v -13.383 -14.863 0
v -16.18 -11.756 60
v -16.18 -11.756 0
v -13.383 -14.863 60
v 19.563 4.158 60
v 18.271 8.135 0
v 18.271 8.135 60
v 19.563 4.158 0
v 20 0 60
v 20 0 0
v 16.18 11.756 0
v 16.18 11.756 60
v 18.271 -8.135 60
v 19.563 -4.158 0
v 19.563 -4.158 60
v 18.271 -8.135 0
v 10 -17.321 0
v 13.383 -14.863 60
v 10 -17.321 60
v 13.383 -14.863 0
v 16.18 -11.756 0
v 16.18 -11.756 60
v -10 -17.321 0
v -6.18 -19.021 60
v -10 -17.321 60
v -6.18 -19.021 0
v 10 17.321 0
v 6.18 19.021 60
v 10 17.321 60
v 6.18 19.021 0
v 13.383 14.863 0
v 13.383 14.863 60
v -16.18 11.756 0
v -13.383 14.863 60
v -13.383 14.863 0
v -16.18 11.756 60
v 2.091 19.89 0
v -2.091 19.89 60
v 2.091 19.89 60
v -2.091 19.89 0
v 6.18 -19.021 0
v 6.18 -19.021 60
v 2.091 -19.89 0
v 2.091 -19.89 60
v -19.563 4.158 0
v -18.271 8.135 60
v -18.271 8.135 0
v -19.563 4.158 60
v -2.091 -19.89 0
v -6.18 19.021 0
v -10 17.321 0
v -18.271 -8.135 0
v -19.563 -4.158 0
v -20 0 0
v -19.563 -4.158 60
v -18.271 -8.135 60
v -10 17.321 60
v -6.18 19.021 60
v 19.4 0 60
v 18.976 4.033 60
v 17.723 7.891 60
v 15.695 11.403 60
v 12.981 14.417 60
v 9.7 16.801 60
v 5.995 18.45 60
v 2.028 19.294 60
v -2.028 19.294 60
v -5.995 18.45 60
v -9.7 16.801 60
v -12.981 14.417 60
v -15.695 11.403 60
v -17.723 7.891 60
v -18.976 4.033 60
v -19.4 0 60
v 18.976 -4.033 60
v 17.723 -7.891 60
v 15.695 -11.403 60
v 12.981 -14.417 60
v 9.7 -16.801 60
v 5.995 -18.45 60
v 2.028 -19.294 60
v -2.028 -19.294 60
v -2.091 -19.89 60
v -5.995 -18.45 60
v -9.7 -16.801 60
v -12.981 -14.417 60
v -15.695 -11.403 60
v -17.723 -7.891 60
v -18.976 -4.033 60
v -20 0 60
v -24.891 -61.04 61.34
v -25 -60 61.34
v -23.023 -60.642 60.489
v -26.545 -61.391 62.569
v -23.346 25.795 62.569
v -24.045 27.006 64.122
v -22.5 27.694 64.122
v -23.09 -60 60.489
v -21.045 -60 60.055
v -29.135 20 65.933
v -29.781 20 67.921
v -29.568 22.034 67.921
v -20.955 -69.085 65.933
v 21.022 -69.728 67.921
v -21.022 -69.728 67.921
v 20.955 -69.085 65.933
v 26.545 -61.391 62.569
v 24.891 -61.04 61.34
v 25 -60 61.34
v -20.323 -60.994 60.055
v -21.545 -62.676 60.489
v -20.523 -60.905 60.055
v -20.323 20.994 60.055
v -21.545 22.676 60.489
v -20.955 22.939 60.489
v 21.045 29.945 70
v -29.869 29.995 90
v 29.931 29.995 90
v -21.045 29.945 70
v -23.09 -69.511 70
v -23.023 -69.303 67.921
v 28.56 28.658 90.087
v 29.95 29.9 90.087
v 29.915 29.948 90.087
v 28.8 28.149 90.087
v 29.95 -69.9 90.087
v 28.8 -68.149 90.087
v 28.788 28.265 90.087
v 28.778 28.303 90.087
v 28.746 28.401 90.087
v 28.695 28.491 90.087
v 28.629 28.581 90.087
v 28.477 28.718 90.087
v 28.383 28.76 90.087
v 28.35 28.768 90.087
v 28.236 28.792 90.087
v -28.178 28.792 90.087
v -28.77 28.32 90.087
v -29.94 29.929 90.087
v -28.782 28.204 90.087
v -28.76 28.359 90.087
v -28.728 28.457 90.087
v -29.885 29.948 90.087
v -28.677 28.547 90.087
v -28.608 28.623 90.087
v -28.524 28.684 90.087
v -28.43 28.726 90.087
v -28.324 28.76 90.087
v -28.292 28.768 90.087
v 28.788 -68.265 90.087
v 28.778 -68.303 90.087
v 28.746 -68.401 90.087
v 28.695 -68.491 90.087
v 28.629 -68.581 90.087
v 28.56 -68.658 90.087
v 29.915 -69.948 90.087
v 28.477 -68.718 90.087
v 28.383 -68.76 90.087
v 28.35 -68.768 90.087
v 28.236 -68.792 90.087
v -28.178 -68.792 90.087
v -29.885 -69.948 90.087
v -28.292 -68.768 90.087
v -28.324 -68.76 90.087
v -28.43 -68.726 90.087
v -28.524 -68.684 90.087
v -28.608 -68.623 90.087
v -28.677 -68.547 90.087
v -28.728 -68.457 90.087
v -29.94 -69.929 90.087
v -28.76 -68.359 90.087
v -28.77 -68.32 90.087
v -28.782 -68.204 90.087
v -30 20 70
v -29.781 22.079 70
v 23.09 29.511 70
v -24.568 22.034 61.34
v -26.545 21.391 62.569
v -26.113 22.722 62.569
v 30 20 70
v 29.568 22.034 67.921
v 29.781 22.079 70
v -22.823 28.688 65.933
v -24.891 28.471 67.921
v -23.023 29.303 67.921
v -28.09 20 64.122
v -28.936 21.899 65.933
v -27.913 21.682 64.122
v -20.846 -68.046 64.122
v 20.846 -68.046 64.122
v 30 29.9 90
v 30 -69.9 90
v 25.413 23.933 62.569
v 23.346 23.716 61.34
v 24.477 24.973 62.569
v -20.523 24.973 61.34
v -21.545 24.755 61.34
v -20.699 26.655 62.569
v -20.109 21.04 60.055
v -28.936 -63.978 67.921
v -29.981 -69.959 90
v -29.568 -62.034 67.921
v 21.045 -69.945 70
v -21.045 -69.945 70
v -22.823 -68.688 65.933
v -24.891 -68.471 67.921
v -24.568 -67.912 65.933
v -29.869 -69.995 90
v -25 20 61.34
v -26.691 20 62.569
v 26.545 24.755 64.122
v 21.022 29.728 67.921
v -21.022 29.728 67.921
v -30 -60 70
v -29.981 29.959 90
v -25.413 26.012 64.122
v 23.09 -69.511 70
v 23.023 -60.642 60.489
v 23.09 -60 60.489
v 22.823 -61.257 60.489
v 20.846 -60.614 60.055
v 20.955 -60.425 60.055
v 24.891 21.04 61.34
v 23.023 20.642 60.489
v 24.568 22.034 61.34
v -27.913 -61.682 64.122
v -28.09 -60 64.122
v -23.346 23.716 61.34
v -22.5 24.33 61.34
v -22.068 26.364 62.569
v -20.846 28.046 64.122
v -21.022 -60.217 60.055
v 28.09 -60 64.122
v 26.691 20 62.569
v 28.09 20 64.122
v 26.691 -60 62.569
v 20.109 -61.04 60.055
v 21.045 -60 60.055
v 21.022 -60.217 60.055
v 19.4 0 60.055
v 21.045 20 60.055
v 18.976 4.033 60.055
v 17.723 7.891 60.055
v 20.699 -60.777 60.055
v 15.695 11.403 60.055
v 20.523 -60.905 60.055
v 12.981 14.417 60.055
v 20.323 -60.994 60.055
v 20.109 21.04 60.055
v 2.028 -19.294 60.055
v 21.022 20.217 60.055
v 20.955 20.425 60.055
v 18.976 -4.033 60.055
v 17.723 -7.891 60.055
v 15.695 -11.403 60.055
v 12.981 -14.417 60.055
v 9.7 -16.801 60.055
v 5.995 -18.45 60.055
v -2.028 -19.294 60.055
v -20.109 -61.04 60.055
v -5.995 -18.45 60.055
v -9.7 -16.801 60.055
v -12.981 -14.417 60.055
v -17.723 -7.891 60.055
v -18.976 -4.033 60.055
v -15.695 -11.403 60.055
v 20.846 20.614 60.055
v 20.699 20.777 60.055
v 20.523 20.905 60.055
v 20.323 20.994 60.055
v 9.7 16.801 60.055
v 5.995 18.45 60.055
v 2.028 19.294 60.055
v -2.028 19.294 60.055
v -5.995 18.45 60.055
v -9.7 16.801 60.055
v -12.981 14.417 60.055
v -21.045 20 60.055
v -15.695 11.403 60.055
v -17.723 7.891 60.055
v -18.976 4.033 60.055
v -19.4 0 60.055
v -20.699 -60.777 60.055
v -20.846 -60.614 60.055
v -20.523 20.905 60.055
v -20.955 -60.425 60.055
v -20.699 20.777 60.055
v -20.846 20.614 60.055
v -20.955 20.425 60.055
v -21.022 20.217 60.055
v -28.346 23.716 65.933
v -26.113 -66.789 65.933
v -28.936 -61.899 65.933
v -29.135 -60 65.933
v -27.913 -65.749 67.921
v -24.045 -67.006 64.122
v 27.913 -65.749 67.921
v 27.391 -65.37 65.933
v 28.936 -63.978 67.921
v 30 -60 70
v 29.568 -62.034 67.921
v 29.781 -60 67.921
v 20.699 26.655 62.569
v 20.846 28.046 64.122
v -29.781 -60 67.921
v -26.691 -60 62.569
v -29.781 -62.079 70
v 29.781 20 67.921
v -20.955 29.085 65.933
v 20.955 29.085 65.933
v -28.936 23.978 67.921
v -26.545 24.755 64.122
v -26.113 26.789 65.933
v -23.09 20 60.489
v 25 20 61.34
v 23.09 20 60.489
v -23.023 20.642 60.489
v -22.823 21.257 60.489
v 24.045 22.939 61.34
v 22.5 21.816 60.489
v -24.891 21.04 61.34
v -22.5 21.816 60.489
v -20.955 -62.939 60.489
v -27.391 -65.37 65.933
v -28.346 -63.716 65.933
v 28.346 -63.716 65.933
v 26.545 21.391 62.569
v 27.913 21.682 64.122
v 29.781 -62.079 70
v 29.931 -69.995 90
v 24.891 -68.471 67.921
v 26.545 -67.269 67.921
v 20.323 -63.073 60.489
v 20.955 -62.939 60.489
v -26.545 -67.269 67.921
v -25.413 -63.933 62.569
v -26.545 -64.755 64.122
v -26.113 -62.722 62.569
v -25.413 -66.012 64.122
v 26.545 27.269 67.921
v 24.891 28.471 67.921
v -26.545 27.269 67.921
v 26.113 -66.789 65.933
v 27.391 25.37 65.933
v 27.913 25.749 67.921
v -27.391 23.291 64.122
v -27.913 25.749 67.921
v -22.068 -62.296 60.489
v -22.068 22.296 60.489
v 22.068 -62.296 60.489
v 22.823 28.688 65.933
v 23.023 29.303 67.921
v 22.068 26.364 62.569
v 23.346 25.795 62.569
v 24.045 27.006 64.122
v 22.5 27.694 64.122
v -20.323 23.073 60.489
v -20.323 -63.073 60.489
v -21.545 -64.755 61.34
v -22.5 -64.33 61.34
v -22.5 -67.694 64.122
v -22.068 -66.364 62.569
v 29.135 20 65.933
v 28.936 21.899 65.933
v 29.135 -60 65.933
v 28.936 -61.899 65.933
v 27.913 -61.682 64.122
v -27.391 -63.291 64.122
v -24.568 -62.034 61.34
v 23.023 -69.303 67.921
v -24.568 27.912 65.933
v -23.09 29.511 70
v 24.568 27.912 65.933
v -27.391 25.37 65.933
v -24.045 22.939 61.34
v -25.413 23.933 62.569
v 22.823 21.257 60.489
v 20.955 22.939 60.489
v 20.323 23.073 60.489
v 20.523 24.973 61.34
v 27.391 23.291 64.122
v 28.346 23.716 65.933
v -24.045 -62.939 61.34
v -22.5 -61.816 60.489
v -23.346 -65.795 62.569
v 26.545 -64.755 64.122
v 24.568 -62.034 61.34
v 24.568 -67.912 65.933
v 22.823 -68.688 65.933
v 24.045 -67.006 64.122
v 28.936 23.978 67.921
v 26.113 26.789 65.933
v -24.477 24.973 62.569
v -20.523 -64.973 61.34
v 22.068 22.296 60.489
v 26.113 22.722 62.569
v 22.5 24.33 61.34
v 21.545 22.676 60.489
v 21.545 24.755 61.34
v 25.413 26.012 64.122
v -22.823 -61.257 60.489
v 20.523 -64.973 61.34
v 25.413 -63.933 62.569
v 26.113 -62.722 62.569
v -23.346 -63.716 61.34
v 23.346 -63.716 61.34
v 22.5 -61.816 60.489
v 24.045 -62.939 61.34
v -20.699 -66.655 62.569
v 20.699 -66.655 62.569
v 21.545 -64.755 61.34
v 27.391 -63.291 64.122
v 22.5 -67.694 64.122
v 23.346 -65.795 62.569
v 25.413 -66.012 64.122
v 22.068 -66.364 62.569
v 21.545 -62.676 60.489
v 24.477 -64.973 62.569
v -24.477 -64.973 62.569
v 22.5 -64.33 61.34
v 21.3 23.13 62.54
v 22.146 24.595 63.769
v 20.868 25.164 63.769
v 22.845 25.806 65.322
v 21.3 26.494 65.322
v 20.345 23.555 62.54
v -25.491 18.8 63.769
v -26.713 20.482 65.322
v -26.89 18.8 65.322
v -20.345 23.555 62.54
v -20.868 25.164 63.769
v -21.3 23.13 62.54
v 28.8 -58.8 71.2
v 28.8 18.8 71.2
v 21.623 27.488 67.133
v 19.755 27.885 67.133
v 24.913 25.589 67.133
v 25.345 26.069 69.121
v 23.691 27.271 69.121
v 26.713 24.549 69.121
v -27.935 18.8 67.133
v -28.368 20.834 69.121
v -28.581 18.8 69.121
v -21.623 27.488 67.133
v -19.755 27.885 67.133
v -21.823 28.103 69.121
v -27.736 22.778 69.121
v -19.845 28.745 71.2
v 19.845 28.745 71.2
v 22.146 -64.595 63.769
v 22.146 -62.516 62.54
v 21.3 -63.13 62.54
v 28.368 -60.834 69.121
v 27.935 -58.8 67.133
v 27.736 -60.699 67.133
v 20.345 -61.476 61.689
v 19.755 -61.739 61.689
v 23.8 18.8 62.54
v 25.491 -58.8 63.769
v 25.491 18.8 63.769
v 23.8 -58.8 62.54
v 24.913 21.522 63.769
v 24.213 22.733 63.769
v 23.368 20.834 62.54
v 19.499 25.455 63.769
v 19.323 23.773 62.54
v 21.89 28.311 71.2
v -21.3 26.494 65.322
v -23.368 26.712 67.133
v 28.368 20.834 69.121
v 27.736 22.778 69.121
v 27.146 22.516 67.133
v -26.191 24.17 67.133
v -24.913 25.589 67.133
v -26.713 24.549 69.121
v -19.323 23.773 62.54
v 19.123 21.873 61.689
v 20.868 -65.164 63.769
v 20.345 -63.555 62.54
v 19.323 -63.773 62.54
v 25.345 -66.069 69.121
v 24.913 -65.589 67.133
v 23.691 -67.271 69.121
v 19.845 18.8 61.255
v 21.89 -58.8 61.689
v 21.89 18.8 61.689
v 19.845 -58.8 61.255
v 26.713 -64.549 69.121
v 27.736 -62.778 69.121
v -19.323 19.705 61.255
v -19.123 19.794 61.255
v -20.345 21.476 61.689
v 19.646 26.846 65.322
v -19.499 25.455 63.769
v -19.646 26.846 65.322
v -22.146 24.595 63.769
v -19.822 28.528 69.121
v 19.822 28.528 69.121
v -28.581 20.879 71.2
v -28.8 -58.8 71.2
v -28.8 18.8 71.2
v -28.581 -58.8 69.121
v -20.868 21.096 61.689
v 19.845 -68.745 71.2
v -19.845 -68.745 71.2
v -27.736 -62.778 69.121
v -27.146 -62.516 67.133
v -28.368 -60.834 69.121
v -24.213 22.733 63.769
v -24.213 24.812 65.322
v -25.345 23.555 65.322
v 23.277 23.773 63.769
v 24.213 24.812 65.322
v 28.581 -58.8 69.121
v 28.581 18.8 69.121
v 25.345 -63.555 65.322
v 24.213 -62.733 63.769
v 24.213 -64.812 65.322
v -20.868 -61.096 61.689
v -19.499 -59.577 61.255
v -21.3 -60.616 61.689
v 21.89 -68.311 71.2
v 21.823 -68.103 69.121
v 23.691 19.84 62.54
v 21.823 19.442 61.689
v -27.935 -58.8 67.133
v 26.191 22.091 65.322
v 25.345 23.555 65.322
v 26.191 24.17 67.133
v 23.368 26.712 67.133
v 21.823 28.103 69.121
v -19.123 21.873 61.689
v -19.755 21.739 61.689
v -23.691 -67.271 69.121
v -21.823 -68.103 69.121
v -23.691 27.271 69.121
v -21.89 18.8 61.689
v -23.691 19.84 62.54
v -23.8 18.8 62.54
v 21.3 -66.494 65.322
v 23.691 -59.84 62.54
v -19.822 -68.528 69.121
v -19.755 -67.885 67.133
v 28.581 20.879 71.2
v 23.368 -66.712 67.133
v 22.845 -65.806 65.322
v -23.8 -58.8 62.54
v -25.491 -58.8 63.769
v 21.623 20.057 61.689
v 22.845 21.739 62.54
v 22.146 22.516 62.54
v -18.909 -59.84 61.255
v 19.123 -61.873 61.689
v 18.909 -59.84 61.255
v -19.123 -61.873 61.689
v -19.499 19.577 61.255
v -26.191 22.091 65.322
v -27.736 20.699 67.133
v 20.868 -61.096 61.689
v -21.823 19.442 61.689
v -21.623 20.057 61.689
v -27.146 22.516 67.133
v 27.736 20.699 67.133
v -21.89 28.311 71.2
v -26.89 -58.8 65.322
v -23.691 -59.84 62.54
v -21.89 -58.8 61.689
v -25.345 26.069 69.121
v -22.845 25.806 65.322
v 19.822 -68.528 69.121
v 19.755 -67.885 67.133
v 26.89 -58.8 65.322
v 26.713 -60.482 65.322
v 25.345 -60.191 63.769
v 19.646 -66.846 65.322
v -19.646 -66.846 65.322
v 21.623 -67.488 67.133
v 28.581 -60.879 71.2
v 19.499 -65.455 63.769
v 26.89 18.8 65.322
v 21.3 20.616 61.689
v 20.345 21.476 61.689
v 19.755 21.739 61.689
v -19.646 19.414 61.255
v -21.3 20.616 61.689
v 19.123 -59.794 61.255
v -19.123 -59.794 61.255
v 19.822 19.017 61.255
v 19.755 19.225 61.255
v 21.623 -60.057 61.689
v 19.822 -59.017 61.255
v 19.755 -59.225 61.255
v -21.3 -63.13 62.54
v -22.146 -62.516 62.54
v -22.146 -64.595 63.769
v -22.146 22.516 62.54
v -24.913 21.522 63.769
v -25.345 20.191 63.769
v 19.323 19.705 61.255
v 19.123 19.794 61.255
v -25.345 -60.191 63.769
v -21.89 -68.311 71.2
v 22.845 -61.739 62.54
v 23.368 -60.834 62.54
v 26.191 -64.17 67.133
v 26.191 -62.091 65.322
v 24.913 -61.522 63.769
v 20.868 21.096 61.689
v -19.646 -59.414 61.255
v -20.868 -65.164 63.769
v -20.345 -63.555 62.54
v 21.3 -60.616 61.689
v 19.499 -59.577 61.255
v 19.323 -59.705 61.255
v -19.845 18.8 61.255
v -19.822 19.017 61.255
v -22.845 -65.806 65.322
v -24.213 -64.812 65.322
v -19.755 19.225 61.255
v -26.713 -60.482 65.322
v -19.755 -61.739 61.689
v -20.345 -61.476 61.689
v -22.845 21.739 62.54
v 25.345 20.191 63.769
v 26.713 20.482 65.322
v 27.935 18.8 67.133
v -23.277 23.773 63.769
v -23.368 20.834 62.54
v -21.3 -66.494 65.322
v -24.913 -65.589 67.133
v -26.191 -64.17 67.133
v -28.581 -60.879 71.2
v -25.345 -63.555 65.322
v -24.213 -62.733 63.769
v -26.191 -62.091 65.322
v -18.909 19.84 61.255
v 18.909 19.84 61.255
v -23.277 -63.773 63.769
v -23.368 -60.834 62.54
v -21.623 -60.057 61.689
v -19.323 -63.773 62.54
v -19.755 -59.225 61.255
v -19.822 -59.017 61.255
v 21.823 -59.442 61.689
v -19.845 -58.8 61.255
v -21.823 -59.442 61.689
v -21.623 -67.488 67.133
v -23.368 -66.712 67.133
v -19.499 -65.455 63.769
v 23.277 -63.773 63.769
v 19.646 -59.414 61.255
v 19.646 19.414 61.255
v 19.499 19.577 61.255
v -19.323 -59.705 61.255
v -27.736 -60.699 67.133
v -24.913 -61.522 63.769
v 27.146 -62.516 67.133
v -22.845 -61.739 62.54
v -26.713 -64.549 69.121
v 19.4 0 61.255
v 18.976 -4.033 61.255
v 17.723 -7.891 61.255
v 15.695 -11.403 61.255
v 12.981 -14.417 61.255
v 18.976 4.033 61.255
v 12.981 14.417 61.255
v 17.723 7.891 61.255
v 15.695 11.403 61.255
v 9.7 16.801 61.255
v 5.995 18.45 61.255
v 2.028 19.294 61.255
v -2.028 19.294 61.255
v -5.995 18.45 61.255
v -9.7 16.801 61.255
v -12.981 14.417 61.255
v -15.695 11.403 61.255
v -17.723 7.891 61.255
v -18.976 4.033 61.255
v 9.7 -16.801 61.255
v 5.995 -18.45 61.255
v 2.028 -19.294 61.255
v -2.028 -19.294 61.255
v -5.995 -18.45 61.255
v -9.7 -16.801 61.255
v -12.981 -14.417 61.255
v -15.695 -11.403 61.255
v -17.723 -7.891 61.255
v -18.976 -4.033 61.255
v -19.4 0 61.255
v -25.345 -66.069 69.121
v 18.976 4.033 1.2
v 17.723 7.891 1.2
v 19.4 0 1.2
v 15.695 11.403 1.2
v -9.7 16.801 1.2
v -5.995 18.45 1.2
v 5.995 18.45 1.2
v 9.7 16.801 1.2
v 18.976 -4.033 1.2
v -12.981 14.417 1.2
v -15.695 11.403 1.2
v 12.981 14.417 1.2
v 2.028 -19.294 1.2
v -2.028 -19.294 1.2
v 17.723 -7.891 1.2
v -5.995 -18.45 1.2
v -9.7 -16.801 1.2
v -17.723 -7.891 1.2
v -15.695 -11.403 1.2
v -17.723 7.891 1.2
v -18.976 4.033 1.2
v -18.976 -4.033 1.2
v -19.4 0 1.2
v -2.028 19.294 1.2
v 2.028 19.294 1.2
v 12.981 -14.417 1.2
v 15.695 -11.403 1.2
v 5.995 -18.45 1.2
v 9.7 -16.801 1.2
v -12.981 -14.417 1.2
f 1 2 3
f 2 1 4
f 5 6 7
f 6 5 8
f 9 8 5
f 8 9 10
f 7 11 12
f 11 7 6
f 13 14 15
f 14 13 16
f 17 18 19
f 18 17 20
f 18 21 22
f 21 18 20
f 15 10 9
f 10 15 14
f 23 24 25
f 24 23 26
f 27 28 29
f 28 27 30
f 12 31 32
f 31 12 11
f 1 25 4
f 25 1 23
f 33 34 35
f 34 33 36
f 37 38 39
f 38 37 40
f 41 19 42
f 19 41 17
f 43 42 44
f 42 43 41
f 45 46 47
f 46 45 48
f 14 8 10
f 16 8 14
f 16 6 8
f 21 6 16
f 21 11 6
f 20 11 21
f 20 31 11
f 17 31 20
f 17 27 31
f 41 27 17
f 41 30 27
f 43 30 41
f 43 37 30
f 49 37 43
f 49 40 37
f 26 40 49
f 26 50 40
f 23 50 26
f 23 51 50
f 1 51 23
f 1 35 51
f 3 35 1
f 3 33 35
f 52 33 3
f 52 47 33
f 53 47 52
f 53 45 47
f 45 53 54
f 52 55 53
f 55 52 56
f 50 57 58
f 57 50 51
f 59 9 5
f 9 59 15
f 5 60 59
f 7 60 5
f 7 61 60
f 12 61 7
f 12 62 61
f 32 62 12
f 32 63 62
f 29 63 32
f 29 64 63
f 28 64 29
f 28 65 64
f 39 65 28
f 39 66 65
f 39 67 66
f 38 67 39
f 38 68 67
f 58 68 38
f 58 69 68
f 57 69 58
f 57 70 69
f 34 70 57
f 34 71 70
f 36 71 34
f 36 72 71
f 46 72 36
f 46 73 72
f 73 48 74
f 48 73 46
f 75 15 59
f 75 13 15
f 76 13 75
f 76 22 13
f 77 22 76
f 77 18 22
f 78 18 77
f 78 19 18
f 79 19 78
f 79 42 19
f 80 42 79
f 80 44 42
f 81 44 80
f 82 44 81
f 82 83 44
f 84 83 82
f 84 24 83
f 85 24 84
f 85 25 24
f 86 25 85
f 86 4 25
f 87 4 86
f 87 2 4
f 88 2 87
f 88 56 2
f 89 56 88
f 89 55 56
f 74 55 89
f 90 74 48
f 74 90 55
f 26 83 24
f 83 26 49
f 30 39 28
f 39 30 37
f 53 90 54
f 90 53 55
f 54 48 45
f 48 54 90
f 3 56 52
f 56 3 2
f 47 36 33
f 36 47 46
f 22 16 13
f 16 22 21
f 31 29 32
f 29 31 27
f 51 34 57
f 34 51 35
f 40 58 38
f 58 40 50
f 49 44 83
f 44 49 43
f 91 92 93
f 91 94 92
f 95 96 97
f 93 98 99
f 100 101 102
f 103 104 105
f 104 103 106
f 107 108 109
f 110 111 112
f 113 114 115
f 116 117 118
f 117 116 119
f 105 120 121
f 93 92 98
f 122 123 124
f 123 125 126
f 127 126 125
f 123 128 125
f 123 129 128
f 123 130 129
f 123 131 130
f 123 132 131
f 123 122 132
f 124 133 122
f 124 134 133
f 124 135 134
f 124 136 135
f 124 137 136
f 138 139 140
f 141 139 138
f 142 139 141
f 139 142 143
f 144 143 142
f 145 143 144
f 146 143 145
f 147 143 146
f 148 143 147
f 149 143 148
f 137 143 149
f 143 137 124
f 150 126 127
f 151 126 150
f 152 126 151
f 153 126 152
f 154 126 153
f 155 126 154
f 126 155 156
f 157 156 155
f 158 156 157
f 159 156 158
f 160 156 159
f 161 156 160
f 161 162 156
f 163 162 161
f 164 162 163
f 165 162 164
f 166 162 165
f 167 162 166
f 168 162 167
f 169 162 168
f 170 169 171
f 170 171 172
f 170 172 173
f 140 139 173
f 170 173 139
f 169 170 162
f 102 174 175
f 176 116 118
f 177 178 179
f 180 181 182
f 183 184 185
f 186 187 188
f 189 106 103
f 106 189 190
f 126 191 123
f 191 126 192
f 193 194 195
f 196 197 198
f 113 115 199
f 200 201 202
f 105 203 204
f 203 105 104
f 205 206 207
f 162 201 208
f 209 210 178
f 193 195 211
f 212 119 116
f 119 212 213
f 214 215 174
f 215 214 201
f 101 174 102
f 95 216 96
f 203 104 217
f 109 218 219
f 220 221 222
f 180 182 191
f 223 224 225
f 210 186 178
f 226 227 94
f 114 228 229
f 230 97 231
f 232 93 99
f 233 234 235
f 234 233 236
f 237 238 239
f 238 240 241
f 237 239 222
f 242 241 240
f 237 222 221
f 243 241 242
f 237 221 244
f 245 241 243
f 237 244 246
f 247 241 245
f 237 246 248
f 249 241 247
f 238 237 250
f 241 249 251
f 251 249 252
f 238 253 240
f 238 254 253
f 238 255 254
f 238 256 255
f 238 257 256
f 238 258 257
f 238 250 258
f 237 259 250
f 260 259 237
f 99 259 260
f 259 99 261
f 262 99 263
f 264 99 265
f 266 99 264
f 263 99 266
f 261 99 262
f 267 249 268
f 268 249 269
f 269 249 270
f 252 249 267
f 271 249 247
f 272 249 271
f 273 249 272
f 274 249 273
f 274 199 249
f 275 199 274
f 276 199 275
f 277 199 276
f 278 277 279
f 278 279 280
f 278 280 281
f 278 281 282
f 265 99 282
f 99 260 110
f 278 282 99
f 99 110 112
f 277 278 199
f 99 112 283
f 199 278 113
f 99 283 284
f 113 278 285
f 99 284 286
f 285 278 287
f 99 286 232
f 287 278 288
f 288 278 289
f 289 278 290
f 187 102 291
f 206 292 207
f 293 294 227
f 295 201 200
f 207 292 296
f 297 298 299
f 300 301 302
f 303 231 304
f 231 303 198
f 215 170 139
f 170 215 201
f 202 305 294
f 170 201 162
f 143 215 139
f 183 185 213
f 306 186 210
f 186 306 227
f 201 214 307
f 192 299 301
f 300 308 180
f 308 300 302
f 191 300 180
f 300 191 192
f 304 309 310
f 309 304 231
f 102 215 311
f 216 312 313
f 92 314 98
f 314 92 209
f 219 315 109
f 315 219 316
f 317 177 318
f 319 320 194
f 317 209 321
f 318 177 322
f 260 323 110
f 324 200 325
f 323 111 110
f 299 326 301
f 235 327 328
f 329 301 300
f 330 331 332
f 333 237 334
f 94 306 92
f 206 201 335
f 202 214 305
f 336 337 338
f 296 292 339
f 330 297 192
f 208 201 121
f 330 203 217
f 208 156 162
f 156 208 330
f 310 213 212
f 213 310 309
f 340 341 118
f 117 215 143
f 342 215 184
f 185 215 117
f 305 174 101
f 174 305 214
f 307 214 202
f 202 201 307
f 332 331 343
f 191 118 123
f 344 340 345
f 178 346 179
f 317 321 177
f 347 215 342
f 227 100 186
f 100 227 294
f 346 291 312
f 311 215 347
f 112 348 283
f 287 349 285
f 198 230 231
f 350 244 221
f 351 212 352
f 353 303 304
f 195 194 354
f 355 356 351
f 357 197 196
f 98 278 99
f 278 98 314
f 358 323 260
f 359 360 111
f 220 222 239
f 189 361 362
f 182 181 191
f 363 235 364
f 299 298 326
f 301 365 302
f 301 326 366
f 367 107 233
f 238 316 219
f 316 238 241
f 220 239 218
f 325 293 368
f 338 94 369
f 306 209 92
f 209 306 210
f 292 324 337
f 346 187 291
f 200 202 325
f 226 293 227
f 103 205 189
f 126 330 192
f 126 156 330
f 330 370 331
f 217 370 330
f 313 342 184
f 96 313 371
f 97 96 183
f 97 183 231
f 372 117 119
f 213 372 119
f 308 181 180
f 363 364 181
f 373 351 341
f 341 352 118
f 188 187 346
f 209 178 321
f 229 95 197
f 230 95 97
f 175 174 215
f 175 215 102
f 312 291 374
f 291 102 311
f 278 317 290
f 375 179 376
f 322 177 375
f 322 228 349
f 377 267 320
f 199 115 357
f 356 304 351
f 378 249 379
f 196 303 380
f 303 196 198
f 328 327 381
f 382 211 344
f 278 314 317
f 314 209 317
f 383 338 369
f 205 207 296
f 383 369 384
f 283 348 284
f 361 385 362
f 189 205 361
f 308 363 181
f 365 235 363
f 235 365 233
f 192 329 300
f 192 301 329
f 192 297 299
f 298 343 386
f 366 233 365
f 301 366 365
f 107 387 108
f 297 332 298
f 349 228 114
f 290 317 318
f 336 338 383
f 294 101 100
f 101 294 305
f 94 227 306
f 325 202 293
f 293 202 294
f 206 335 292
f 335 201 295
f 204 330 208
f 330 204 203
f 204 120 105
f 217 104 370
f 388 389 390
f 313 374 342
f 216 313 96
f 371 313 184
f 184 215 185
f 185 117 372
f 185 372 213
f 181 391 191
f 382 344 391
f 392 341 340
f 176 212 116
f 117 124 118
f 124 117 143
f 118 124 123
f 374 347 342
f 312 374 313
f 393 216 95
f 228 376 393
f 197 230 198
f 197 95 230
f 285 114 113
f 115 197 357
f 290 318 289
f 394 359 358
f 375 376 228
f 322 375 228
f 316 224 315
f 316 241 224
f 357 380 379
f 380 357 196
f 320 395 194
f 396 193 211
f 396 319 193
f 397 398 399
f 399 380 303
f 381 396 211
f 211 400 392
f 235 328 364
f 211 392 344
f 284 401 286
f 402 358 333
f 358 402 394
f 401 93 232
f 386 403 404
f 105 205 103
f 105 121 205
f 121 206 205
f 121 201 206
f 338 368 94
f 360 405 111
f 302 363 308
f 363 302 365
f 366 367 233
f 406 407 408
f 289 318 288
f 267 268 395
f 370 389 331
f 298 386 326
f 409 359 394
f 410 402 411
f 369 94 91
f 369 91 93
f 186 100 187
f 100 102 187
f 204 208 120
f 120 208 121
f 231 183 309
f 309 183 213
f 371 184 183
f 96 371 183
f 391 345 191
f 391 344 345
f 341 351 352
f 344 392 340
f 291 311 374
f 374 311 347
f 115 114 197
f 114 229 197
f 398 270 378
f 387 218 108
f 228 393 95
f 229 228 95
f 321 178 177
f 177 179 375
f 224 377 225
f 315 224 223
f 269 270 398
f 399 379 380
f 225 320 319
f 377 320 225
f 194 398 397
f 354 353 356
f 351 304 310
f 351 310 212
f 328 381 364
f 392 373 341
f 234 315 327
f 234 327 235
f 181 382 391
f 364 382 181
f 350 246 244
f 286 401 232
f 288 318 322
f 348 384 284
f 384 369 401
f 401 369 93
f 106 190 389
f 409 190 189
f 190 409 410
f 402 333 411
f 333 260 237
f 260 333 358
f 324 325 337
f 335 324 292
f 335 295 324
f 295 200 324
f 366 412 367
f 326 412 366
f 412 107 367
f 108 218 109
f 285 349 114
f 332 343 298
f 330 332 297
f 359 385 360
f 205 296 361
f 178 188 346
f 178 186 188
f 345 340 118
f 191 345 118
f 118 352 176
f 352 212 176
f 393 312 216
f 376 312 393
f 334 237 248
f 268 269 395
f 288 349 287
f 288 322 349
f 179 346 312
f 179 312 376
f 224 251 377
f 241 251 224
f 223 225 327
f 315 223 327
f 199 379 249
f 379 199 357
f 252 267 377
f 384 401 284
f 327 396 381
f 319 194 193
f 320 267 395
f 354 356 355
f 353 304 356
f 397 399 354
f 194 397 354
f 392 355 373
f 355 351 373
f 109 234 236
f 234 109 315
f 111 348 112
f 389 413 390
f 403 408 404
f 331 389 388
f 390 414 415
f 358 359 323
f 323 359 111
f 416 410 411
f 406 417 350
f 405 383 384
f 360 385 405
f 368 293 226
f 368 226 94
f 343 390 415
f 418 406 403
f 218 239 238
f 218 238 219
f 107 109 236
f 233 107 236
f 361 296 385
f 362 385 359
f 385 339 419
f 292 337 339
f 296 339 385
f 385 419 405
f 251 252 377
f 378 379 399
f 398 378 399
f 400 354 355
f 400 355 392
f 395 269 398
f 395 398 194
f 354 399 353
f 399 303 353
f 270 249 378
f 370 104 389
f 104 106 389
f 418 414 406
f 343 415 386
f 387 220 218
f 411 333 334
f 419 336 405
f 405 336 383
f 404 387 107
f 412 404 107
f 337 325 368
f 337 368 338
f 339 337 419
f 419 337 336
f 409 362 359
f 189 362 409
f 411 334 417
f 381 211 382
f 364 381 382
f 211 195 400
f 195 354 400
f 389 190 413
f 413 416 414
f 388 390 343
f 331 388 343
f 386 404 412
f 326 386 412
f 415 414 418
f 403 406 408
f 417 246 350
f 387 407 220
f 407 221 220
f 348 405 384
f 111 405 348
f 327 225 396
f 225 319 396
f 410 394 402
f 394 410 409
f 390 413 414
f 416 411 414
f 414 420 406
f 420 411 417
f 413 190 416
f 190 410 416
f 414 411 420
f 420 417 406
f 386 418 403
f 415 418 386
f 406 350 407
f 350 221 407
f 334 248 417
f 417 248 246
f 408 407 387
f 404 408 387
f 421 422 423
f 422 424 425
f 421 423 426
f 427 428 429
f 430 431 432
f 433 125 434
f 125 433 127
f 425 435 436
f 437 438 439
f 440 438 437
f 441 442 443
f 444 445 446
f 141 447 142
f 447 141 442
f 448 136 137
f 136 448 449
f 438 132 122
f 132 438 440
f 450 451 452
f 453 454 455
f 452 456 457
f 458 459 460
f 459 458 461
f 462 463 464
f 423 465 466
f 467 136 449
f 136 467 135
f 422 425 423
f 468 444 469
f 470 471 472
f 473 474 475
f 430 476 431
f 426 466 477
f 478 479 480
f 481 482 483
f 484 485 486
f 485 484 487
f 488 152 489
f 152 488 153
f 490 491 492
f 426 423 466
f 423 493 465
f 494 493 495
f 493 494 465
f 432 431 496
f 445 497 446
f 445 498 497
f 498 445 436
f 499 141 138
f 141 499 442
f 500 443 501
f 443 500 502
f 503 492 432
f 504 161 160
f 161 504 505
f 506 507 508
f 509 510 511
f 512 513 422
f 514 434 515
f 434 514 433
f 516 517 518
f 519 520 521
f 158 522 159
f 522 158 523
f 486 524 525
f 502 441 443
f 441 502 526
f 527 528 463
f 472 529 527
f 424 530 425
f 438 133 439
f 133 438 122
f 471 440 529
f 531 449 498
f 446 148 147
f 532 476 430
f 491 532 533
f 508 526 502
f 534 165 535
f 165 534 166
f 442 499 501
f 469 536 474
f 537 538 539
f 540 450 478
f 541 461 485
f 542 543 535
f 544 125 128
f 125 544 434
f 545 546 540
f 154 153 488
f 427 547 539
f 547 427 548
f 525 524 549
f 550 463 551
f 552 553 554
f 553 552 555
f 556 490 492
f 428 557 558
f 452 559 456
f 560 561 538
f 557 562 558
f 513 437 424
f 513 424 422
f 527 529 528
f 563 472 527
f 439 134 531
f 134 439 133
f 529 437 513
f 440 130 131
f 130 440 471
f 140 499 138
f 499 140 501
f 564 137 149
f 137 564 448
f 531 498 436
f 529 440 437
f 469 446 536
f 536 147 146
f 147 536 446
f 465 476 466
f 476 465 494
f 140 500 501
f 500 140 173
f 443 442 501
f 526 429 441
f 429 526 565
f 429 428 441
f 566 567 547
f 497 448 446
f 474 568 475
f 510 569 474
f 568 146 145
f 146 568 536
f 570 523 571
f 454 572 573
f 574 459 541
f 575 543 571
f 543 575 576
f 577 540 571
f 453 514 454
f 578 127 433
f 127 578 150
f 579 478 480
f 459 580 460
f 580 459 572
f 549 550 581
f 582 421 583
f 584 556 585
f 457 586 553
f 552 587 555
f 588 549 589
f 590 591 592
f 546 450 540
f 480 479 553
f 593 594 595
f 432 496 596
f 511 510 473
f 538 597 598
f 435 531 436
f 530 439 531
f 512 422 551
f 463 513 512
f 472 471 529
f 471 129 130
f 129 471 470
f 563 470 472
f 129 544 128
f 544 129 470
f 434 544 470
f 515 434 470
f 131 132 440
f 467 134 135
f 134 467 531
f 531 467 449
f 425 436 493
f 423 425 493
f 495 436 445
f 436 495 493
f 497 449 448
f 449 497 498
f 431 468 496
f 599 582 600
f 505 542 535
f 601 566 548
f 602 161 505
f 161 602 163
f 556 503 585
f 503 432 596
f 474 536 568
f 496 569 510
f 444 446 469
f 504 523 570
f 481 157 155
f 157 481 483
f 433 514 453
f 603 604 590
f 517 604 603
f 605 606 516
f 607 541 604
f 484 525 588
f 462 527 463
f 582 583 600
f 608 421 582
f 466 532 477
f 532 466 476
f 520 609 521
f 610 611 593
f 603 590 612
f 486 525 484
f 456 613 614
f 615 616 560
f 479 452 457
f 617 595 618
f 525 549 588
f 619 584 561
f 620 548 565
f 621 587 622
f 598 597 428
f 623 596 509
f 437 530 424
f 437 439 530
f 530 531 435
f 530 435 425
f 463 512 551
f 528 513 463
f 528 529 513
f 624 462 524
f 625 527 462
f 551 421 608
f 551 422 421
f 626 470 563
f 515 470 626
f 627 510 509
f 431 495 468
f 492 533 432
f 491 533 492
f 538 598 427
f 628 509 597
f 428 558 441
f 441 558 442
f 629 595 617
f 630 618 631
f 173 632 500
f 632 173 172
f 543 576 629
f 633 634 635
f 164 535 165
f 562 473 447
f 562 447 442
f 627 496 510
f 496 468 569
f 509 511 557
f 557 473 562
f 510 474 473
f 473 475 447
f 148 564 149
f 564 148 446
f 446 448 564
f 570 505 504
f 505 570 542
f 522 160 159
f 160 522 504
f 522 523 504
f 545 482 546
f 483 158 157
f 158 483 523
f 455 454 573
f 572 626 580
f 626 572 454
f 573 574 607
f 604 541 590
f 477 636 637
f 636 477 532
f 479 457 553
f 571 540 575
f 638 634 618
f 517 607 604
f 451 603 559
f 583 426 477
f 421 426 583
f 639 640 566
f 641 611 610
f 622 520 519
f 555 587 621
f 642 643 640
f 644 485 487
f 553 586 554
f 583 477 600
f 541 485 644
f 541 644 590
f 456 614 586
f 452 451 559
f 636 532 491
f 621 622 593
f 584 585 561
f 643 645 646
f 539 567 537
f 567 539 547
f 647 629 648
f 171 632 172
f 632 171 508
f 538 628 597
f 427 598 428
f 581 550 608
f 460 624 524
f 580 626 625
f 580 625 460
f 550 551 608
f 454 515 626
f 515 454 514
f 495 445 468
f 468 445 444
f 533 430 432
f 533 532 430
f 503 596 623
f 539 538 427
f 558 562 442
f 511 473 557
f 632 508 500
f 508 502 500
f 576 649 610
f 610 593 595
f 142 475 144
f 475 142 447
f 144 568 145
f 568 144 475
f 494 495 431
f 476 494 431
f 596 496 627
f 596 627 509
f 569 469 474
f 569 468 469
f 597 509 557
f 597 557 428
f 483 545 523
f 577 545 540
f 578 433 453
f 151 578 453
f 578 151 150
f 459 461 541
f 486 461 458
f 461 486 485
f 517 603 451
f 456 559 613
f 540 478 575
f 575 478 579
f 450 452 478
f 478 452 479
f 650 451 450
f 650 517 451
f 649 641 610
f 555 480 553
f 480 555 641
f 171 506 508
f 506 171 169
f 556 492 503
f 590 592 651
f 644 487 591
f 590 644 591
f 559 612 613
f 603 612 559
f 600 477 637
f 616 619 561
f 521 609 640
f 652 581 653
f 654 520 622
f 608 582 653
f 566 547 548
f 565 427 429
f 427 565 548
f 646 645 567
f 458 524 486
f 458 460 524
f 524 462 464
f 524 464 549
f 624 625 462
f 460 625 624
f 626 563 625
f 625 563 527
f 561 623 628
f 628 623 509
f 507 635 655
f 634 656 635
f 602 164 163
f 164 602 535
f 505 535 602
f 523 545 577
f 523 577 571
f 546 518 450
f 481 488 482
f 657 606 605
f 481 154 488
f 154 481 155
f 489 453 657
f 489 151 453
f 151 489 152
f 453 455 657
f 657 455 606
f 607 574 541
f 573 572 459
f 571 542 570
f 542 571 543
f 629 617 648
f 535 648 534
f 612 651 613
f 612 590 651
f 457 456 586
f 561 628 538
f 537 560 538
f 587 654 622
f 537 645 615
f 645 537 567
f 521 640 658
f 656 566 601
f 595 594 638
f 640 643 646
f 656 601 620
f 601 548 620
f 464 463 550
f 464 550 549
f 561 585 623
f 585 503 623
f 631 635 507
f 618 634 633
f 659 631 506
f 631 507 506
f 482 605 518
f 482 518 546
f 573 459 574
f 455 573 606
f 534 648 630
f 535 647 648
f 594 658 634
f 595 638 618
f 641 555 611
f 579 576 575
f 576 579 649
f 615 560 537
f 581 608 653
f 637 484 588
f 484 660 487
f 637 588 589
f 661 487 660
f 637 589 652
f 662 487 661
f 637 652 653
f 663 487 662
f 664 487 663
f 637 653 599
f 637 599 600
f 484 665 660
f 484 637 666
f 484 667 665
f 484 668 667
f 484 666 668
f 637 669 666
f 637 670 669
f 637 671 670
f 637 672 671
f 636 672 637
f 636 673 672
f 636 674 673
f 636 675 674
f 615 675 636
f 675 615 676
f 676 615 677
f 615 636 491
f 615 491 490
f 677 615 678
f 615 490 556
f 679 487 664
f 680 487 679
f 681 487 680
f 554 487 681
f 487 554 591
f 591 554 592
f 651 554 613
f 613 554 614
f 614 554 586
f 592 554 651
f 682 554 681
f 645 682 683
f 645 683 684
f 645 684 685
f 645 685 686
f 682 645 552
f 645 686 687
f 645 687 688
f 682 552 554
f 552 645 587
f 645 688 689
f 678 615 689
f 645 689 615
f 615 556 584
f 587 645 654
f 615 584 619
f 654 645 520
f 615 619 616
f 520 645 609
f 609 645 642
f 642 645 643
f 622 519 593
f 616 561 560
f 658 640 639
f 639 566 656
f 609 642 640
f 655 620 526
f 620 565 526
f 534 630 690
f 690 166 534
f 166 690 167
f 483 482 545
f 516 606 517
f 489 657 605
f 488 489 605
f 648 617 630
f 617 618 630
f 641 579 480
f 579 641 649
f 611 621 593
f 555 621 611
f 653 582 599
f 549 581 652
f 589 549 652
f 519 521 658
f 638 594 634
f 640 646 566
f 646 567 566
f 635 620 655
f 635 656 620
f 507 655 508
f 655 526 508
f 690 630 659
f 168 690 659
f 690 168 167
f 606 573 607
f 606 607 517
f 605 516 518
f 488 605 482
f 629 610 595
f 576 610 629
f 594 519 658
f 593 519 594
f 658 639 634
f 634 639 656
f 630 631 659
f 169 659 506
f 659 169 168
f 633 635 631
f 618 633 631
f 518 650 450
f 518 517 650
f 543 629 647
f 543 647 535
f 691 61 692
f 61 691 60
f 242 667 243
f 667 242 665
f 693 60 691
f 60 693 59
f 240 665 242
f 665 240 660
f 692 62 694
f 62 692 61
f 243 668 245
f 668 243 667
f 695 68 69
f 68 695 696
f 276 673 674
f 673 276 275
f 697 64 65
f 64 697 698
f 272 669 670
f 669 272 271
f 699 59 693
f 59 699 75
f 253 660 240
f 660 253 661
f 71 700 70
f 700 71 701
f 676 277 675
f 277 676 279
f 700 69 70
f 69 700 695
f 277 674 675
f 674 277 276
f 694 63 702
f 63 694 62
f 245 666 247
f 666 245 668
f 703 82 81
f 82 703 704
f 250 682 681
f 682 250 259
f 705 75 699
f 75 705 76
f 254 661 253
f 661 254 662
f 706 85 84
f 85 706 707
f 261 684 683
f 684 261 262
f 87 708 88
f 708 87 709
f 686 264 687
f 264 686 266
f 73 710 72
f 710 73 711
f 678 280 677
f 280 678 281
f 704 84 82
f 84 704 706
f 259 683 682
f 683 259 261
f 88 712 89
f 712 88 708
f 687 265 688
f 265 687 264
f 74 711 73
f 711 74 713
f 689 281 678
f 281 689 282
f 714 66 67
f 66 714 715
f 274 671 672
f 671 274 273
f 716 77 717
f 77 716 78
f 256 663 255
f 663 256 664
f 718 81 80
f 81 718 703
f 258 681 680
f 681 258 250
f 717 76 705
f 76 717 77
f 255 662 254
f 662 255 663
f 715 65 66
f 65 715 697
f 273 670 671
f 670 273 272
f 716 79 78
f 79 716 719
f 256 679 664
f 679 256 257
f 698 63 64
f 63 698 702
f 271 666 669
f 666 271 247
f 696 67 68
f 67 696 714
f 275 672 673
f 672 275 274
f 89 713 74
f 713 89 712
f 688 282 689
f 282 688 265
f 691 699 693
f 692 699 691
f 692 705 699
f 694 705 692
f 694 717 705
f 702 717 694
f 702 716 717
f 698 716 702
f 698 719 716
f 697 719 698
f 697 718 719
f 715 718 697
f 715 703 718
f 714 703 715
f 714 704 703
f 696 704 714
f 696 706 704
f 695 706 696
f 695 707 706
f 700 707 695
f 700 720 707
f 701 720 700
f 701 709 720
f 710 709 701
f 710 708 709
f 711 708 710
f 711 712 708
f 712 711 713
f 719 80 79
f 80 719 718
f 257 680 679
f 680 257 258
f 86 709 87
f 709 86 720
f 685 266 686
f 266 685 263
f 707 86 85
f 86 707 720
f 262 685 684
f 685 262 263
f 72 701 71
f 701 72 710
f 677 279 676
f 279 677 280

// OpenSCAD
r = 20; // Motor cover radius
h = 60; // Motor cover height

x = 60; // Cube width
y = 100; // Cube length
z = 40; // Cube height;

t = 1.2;

// Upper shell


difference() {
    union() {
        cylinder(h, r=r);
        translate([0, -20, h + z/2]) roundedcube(x,y,z,10);
    }
    translate([0, -20, h + z/2 + t]) roundedcube(x-t*2,y-t*2,z,10);
    translate([0, 0, t]) cylinder(h+t, r=r-t/2);   
}

module roundedcube(w,h,d,r){
    hull() {
        translate([0, 0, d/2 - r]) spheres(0.1);
        translate([0, 0, -d/2 + r]) spheres(r);
    }
    
    module spheres(r) {
        translate([w/2 - r, h/2 - r]) sphere(r);
        translate([-w/2 + r, h/2 - r]) sphere(r);
        translate([w/2 - r, -h/2 + r]) sphere(r);
        translate([-w/2 + r, -h/2 + r]) sphere(r);
    }
}
